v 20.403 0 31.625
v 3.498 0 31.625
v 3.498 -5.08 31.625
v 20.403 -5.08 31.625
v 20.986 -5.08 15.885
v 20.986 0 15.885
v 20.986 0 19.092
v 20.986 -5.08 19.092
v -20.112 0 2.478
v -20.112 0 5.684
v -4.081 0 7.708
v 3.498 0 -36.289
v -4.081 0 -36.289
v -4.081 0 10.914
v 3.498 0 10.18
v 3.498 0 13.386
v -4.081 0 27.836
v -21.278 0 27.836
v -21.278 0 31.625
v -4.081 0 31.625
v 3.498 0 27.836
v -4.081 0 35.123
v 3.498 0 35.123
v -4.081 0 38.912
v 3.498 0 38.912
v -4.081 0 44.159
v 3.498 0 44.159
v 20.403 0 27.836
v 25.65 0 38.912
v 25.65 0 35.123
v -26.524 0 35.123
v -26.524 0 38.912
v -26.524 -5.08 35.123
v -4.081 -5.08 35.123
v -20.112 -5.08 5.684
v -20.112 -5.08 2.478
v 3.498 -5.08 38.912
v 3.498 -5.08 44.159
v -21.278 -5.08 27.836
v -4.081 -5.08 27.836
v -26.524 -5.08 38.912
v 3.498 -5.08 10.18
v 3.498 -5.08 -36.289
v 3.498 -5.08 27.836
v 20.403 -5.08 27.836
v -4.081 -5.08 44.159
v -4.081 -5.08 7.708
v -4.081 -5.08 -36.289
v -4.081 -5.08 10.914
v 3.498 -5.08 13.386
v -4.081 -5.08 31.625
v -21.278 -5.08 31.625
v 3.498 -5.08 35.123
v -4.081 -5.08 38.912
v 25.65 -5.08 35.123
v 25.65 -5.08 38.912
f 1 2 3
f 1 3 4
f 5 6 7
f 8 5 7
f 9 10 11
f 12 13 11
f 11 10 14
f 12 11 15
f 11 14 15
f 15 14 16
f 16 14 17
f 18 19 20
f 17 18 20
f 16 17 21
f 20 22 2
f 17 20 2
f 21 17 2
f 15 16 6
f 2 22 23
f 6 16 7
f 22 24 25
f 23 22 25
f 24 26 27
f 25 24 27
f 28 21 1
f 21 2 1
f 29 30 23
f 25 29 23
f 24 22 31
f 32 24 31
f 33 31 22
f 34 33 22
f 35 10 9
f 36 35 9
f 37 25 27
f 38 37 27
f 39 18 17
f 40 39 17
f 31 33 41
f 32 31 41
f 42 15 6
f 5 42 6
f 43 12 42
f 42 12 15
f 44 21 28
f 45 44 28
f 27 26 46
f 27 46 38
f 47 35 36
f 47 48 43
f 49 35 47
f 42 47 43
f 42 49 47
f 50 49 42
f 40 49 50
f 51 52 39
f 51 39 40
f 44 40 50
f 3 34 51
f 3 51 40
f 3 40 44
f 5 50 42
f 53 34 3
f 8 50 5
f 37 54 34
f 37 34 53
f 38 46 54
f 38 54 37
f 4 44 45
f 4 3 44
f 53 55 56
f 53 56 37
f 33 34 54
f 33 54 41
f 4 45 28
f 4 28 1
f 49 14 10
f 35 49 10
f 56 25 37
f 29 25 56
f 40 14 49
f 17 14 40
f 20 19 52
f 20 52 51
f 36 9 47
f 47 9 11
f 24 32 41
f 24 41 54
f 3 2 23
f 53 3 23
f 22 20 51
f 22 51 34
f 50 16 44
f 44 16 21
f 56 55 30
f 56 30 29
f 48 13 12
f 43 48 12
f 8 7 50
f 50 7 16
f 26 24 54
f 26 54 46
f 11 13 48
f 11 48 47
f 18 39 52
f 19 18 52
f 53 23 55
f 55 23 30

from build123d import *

# Parameters (mm, degrees)
F0_W     = 7.578362
F0_H     = 80.447212
F1_DEPTH = 5.08
F2_W     = 52.174097
F2_H     = 3.789182
F2_W_2   = 41.680984
F2_H_2   = 3.789179
F3_DEPTH = 5.08
F4_DEPTH = 5.08
F6_DEPTH = 5.08


with BuildPart() as f1:
    # F0 (on Front) → F1 (new body)
    with BuildSketch(Plane.XZ):
        with Locations((-0.291475, 3.934916)):
            Rectangle(F0_W, F0_H)
    extrude(amount=F1_DEPTH)

    # F2 (on Front) → F3 (join)
    with BuildSketch(Plane.XZ):
        with Locations((-0.437214, 37.017377)):
            Rectangle(F2_W, F2_H)
        with Locations((-0.437213, 29.730491)):
            Rectangle(F2_W_2, F2_H_2)
    extrude(amount=F3_DEPTH)

    # F2 (on Front) → F4 (join)
    with BuildSketch(Plane.XZ):
        with Locations((-0.437214, 37.017377)):
            Rectangle(F2_W, F2_H)
        with Locations((-0.437213, 29.730491)):
            Rectangle(F2_W_2, F2_H_2)
    extrude(amount=F4_DEPTH)

    # F5 (on Front) → F6 (join)
    with BuildSketch(Plane.XZ):
        Polygon((20.986229, 19.09164), (-20.111803, 5.683771), (-20.111803, 2.477542), (20.986229, 15.885411), align=None)
    extrude(amount=F6_DEPTH)


solid = f1.part
